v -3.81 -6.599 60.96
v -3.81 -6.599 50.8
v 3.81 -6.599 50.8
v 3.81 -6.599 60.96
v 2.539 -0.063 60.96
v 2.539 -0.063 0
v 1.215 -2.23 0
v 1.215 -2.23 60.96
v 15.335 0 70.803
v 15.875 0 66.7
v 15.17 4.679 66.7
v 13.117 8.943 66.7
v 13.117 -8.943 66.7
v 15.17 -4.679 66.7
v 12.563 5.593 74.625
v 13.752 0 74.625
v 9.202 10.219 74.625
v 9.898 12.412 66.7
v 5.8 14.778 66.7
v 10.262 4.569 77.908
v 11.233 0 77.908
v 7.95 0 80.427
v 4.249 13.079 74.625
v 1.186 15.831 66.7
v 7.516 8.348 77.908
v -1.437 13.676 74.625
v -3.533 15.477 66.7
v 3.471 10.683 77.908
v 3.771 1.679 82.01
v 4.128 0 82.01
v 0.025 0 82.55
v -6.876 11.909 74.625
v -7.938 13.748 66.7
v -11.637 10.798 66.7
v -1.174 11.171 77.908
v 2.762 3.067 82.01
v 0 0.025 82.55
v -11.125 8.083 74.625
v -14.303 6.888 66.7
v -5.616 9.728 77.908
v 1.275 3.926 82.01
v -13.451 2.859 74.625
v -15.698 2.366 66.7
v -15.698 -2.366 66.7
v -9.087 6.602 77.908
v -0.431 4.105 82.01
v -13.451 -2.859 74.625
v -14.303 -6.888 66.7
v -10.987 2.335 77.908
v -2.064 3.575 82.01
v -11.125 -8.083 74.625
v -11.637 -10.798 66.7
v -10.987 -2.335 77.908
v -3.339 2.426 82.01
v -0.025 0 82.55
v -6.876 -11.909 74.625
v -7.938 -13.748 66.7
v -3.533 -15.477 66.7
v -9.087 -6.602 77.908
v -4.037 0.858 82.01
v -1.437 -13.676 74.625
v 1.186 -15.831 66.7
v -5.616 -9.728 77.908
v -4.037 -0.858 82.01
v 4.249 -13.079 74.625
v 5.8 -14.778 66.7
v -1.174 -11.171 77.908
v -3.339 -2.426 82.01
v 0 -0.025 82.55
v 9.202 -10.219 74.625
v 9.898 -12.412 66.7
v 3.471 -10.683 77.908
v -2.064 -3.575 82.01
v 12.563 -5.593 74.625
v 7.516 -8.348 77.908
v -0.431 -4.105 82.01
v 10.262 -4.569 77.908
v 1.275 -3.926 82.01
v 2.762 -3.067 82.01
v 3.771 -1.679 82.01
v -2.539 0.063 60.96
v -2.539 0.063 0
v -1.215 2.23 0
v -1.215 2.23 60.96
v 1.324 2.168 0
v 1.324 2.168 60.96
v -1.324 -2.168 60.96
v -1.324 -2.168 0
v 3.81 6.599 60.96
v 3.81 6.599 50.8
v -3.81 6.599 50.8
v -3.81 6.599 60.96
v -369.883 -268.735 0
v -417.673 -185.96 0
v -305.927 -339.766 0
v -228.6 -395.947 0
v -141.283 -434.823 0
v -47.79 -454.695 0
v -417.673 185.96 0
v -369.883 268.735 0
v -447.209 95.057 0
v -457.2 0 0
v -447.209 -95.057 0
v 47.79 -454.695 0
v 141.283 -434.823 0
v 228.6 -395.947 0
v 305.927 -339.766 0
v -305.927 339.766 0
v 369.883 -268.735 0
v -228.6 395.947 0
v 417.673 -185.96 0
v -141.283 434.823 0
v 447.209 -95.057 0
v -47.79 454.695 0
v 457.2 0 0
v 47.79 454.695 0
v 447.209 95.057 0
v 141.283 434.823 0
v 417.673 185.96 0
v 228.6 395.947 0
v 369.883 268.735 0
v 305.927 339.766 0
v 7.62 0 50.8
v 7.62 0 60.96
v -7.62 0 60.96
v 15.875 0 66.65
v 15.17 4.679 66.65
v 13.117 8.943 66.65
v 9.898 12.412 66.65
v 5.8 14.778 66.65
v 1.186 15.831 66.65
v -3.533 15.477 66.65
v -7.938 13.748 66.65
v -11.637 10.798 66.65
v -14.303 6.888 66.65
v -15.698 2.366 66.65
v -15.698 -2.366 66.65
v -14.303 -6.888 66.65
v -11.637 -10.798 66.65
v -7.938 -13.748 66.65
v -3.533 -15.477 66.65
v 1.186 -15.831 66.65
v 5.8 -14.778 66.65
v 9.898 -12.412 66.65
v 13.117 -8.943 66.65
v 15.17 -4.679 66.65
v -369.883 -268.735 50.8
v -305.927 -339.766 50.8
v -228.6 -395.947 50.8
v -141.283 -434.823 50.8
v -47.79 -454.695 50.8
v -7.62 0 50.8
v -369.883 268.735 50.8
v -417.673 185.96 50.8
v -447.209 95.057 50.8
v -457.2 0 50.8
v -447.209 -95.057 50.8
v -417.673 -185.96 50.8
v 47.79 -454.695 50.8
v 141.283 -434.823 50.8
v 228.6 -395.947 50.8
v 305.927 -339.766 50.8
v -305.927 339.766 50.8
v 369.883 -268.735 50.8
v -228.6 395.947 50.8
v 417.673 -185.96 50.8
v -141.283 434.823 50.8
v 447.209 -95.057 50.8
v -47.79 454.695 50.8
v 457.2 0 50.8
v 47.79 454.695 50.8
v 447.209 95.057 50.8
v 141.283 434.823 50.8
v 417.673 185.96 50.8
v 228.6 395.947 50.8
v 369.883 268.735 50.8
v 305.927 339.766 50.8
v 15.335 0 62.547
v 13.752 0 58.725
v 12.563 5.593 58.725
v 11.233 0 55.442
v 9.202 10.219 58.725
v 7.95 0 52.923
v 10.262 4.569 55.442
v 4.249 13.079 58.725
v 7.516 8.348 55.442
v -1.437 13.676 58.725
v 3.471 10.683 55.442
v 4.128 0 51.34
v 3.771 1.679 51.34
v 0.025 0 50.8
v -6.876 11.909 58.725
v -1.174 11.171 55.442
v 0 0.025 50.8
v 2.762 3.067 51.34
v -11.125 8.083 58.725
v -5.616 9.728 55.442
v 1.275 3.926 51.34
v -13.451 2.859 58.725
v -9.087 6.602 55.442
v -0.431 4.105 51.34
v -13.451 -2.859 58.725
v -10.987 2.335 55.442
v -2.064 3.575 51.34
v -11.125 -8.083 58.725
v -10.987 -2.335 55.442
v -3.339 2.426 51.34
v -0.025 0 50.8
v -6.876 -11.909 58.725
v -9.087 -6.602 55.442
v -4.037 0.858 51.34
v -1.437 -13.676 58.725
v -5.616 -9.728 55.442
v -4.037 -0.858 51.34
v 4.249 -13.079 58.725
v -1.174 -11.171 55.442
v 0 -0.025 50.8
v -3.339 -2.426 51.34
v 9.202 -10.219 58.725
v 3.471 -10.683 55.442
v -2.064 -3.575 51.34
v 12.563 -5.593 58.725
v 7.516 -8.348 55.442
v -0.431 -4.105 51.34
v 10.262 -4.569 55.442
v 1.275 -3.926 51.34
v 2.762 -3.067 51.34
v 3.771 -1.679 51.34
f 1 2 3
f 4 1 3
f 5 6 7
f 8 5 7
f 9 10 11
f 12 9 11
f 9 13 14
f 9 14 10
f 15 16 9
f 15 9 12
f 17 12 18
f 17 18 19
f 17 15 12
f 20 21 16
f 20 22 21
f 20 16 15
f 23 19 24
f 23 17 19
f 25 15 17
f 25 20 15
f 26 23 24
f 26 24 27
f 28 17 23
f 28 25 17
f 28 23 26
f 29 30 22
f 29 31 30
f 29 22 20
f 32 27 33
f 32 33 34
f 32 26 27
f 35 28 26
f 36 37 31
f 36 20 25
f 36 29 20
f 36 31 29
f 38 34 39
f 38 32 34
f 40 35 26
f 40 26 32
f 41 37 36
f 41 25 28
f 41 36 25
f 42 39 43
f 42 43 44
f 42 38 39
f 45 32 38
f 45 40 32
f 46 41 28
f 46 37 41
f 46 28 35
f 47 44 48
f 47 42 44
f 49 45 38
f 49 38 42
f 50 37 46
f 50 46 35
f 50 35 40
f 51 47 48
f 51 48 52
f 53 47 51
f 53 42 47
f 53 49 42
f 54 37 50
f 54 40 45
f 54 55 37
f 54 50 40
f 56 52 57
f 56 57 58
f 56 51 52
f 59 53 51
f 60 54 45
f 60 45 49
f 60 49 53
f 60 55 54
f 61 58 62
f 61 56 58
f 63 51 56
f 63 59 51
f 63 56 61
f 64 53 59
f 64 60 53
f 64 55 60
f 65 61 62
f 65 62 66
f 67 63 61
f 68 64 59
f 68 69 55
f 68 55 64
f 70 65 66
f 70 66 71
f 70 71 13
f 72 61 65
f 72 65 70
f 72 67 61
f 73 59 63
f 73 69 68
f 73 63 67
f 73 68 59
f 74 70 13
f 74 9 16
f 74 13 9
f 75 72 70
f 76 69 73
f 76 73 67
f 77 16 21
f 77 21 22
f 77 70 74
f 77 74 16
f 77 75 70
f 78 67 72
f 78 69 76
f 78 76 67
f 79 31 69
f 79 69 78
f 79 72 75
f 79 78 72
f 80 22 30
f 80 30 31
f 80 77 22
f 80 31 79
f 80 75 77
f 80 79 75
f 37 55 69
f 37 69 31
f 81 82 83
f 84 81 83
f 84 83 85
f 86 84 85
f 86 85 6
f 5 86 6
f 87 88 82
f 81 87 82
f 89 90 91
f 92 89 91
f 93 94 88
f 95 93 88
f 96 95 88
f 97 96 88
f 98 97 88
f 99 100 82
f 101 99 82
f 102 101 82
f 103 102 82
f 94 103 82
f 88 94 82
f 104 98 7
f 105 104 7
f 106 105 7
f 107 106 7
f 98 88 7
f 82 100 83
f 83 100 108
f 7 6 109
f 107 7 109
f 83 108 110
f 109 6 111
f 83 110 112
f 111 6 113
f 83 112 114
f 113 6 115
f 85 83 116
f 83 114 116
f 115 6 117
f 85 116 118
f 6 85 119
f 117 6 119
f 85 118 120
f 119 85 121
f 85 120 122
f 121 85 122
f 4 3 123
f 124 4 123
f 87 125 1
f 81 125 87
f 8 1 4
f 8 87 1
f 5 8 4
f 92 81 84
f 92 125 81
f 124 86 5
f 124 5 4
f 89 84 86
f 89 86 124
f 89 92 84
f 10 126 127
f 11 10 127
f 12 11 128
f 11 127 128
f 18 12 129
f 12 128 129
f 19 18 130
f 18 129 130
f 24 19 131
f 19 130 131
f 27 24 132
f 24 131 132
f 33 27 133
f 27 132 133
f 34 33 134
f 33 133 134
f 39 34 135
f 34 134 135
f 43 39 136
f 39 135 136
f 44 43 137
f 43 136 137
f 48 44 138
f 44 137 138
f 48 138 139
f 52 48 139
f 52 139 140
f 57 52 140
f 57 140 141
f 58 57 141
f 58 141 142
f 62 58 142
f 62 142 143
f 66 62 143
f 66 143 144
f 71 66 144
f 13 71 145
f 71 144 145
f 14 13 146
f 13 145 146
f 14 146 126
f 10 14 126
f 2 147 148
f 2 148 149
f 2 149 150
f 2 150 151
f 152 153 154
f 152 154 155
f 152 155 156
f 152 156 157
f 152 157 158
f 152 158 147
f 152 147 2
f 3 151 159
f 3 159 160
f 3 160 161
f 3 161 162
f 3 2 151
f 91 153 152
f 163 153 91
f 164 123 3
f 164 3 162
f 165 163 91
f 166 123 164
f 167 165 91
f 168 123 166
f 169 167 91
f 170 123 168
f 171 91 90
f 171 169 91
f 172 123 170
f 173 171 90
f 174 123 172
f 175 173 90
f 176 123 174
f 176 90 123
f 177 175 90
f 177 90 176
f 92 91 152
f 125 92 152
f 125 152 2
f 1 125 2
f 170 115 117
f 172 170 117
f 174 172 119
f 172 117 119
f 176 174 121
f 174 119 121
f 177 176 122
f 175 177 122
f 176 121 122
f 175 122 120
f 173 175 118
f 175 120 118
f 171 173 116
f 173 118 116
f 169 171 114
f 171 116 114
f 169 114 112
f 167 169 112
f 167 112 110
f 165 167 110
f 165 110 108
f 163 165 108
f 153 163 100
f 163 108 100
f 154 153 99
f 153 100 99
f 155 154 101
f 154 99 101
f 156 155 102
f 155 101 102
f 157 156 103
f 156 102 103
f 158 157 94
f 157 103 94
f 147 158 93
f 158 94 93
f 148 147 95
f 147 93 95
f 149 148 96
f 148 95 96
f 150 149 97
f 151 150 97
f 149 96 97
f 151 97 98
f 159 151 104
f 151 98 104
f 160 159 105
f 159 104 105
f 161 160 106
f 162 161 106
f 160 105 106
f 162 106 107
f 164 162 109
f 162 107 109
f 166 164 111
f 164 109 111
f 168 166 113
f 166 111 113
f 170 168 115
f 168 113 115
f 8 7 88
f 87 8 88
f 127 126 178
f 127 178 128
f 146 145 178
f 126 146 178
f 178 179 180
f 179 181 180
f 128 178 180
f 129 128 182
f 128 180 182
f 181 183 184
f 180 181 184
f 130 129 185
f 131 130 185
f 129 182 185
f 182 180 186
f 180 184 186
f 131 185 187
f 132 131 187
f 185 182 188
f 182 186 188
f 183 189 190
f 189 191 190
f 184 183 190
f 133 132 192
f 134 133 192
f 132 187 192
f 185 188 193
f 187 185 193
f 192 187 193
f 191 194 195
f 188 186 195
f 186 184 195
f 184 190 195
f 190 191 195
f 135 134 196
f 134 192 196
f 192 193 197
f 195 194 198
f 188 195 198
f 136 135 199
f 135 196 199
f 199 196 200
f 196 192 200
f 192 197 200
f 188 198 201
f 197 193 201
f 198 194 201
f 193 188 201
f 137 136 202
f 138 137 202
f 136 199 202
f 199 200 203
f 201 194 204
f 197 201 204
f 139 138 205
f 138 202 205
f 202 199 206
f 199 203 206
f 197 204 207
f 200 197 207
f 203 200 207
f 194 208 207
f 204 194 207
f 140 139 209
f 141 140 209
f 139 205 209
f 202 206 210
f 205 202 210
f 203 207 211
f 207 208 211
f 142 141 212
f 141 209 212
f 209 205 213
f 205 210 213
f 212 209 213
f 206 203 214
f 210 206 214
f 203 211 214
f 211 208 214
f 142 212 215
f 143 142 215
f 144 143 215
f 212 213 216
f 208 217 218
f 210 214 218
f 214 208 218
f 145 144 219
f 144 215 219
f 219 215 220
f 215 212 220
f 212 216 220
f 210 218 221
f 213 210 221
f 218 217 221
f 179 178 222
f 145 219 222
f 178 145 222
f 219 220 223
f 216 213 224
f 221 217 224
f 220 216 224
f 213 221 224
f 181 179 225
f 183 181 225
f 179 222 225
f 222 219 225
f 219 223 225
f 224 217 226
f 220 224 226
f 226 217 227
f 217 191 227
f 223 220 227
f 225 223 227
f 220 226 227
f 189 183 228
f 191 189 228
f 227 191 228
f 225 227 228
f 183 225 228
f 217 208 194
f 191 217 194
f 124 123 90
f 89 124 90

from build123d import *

# Parameters (mm, degrees)
F0_R     = 457.2
F1_DEPTH = 50.8
F2_DEPTH = 60.96
F3_R     = 15.875
F4_DEPTH = 31.75
F5_R     = 15.8496


with BuildPart() as f1:
    # F0 (on Top) → F1 (new body)
    with BuildSketch(Plane.XY):
        Circle(F0_R)
        Polygon((-3.81, 6.5991135768), (3.81, 6.5991135768), (7.62, 0), (3.81, -6.5991135768), (-3.81, -6.5991135768), (-7.62, 0), align=None, mode=Mode.SUBTRACT)
    extrude(amount=F1_DEPTH)

    # F0 (on Top) → F2 (join)
    with BuildSketch(Plane.XY):
        Polygon((7.62, 0), (3.81, 6.5991135768), (-3.81, 6.5991135768), (-7.62, 0), (-3.81, -6.5991135768), (3.81, -6.5991135768), align=None)
        Polygon((-1.2154102297, 2.2303313596), (1.3238185014, 2.1677418147), (2.5392287311, -0.0625895449), (1.2154102297, -2.2303313596), (-1.3238185014, -2.1677418147), (-2.5392287311, 0.0625895449), align=None, mode=Mode.SUBTRACT)
    extrude(amount=F2_DEPTH)


with BuildPart() as f4:
    # F3 (on face) → F4 (new body)
    with BuildSketch(Plane.XY.offset(50.8)):
        Circle(F3_R)
    extrude(amount=F4_DEPTH)

    # F5
    f5_edges = [f4.edges().sort_by_distance(p)[0] for p in [
        (-15.875, 0, 82.55),
        (-15.875, 0, 50.8),
    ]]
    fillet(f5_edges, radius=F5_R)


solid = Compound([f1.part, f4.part])
